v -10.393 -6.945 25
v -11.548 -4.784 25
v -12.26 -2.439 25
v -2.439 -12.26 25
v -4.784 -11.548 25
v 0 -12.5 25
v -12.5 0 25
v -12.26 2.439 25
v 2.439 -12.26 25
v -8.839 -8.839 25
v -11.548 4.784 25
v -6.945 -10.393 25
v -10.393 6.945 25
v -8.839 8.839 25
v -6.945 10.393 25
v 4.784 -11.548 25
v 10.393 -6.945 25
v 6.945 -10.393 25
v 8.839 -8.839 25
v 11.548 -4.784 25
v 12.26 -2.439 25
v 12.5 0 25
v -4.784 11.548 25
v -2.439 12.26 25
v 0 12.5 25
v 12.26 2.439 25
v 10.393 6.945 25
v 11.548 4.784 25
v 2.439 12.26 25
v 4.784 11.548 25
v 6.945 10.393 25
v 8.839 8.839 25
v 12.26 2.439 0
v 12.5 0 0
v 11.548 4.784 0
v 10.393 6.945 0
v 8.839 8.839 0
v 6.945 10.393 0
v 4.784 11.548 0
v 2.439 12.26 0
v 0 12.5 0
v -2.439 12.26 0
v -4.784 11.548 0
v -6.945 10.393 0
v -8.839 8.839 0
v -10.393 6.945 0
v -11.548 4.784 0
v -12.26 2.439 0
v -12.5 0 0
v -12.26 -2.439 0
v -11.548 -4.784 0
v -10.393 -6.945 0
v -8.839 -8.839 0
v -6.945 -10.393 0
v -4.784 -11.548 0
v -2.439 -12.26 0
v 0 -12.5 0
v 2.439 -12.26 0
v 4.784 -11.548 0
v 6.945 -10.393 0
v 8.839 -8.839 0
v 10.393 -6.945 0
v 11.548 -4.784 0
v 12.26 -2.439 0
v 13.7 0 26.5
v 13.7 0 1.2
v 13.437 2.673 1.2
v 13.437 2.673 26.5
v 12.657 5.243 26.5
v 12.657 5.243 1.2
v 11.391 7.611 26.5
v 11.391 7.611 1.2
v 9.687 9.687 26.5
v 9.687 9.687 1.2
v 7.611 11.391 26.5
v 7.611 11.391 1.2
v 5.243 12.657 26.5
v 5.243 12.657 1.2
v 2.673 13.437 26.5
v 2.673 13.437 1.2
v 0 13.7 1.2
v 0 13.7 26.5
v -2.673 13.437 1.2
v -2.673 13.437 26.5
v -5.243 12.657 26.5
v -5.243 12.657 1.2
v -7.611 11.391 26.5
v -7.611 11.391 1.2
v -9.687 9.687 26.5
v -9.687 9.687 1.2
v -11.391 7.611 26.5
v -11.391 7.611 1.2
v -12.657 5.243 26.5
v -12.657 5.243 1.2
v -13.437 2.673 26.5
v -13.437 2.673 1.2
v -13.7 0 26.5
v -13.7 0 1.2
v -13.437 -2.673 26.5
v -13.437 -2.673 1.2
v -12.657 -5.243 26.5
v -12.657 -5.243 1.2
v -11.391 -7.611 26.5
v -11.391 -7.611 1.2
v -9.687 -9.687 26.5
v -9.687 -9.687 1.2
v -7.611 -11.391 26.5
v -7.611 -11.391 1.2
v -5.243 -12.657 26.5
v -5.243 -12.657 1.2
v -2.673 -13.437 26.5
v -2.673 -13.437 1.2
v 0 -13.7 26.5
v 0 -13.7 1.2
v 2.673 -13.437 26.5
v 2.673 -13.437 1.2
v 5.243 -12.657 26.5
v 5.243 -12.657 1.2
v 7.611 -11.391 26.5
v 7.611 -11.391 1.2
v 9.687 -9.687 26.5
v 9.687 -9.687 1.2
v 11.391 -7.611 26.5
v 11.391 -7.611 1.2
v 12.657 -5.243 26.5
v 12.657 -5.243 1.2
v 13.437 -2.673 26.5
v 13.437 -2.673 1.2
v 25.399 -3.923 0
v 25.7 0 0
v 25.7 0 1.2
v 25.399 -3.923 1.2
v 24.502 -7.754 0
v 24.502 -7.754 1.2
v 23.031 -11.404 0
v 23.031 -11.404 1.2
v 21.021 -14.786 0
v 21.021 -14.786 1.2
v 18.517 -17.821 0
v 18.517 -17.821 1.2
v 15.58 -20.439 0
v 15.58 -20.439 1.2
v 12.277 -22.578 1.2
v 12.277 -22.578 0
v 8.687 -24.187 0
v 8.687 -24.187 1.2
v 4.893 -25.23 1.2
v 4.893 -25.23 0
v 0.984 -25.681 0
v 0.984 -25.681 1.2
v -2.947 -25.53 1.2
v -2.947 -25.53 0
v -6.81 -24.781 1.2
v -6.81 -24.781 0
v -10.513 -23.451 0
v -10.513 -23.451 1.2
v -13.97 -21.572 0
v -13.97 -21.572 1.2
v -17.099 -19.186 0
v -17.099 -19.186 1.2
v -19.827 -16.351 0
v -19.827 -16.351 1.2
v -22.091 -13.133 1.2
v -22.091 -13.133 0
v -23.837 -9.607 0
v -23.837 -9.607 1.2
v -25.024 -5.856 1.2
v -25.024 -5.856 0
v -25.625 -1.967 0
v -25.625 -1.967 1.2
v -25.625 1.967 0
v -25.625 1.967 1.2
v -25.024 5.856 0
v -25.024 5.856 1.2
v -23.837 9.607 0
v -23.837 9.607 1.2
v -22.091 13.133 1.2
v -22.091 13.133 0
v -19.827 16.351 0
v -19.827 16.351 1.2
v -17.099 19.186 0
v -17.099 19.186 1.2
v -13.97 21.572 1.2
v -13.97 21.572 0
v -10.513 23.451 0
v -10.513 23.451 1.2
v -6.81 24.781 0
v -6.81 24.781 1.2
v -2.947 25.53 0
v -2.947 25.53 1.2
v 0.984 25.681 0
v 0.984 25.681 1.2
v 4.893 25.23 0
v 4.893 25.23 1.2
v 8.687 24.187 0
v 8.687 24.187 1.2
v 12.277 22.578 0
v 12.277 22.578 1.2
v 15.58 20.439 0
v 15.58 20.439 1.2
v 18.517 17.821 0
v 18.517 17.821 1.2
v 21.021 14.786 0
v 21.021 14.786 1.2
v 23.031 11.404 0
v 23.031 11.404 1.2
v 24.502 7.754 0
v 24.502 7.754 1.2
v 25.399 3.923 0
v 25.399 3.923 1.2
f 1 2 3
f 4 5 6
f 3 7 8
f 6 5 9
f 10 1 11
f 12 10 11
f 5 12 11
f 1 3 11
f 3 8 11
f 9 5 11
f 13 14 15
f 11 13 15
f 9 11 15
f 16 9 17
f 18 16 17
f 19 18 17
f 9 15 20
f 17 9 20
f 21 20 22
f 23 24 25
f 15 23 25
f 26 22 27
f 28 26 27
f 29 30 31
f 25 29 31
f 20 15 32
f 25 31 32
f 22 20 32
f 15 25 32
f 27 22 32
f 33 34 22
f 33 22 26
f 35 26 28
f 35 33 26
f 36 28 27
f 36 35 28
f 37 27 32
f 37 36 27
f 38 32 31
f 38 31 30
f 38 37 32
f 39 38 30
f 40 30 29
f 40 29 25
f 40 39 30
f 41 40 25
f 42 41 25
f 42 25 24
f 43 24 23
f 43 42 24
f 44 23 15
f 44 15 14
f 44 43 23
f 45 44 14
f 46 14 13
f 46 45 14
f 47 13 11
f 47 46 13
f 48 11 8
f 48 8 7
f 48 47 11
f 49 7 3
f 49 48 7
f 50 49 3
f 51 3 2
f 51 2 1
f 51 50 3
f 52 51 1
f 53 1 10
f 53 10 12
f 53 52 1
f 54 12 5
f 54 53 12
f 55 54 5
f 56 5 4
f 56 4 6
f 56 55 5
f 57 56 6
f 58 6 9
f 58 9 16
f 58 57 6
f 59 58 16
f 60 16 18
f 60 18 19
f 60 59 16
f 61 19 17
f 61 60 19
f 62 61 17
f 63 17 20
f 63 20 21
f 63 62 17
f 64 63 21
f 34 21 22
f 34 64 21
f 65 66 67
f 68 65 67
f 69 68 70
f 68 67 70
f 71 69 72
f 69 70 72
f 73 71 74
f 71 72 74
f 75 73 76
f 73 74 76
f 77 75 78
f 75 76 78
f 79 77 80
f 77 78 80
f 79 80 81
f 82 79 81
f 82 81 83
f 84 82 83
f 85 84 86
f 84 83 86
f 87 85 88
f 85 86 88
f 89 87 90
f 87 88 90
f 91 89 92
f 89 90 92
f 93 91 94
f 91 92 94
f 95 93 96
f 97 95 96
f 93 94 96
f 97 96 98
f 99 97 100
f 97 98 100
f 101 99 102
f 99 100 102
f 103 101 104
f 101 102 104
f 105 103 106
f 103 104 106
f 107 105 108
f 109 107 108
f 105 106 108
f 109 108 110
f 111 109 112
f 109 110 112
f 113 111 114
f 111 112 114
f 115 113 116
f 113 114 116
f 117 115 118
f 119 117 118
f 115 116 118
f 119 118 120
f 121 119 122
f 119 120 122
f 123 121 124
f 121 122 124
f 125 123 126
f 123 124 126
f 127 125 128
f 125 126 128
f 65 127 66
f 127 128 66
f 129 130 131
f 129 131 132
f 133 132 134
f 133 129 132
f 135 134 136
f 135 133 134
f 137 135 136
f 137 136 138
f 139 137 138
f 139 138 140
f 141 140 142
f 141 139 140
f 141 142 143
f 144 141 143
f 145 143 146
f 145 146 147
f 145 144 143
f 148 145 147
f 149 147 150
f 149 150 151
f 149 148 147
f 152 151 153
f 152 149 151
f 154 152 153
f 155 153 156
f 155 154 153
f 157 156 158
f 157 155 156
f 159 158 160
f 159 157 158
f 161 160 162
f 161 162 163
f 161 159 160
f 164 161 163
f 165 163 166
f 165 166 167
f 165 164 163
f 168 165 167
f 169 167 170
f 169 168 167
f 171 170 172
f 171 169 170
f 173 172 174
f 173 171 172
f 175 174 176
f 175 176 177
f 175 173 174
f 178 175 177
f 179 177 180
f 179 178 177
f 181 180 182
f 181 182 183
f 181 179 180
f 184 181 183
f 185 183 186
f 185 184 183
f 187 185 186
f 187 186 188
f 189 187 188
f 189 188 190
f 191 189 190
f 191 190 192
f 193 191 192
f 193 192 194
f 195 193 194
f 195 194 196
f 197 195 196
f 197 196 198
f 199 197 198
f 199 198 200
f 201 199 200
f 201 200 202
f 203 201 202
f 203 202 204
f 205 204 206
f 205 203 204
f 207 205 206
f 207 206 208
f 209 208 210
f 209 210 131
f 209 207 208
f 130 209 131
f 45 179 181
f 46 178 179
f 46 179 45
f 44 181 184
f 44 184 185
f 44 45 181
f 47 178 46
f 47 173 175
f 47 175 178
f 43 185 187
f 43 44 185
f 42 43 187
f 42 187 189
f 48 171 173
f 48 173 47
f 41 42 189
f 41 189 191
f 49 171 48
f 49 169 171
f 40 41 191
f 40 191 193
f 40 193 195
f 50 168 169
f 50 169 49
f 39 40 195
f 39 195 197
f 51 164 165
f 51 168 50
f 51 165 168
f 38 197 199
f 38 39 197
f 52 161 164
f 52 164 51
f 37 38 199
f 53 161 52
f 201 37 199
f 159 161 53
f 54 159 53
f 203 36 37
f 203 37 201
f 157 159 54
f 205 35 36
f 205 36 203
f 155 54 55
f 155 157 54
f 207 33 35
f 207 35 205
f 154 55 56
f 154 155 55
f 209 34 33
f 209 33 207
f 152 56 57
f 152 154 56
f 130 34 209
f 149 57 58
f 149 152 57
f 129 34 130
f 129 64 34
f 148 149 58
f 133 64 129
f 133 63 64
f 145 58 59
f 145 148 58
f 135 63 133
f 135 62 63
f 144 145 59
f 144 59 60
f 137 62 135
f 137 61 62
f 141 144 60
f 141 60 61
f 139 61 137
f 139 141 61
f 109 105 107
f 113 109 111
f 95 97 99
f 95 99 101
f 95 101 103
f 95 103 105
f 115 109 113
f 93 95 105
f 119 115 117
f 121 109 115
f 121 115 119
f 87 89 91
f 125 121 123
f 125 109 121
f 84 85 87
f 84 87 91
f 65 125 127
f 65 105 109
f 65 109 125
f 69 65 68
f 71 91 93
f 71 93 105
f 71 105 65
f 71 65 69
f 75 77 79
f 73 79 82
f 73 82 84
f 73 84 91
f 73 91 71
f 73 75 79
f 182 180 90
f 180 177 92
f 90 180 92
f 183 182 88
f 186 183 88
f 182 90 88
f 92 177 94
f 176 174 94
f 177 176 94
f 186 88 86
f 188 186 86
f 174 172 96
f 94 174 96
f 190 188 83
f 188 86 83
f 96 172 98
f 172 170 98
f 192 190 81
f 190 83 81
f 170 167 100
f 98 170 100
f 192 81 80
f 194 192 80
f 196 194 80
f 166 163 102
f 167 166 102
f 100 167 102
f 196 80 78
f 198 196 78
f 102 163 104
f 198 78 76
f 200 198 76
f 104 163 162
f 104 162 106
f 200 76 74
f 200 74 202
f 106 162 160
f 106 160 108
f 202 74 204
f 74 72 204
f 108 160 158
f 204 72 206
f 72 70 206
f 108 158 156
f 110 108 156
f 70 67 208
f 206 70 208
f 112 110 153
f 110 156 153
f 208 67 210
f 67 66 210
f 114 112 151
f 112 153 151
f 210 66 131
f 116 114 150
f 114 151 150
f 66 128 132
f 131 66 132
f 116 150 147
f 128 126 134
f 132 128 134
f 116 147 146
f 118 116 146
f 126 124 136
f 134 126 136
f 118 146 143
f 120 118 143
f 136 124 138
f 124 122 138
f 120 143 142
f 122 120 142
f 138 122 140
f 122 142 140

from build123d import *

# Parameters (mm, degrees)
F0_R     = 13.7
F0_R_2   = 12.5
F1_DEPTH = 25
F2_R     = 13.7
F3_DEPTH = 1.5
F4_R     = 25.7
F4_R_2   = 13.7
F5_DEPTH = 1.2


with BuildPart() as f1:
    # F0 (on Top) → F1 (new body)
    with BuildSketch(Plane.XY):
        Circle(F0_R)
        Circle(F0_R_2, mode=Mode.SUBTRACT)
    extrude(amount=F1_DEPTH)

    # F2 (on face) → F3 (join)
    with BuildSketch(Plane.XY.offset(25)):
        Circle(F2_R)
    extrude(amount=F3_DEPTH)

    # F4 (on face) → F5 (join)
    with BuildSketch(Plane(origin=(0, 0, 0), x_dir=(1, 0, 0), z_dir=(0, 0, -1))):
        Circle(F4_R)
        Circle(F4_R_2, mode=Mode.SUBTRACT)
    extrude(amount=-F5_DEPTH)


solid = f1.part
